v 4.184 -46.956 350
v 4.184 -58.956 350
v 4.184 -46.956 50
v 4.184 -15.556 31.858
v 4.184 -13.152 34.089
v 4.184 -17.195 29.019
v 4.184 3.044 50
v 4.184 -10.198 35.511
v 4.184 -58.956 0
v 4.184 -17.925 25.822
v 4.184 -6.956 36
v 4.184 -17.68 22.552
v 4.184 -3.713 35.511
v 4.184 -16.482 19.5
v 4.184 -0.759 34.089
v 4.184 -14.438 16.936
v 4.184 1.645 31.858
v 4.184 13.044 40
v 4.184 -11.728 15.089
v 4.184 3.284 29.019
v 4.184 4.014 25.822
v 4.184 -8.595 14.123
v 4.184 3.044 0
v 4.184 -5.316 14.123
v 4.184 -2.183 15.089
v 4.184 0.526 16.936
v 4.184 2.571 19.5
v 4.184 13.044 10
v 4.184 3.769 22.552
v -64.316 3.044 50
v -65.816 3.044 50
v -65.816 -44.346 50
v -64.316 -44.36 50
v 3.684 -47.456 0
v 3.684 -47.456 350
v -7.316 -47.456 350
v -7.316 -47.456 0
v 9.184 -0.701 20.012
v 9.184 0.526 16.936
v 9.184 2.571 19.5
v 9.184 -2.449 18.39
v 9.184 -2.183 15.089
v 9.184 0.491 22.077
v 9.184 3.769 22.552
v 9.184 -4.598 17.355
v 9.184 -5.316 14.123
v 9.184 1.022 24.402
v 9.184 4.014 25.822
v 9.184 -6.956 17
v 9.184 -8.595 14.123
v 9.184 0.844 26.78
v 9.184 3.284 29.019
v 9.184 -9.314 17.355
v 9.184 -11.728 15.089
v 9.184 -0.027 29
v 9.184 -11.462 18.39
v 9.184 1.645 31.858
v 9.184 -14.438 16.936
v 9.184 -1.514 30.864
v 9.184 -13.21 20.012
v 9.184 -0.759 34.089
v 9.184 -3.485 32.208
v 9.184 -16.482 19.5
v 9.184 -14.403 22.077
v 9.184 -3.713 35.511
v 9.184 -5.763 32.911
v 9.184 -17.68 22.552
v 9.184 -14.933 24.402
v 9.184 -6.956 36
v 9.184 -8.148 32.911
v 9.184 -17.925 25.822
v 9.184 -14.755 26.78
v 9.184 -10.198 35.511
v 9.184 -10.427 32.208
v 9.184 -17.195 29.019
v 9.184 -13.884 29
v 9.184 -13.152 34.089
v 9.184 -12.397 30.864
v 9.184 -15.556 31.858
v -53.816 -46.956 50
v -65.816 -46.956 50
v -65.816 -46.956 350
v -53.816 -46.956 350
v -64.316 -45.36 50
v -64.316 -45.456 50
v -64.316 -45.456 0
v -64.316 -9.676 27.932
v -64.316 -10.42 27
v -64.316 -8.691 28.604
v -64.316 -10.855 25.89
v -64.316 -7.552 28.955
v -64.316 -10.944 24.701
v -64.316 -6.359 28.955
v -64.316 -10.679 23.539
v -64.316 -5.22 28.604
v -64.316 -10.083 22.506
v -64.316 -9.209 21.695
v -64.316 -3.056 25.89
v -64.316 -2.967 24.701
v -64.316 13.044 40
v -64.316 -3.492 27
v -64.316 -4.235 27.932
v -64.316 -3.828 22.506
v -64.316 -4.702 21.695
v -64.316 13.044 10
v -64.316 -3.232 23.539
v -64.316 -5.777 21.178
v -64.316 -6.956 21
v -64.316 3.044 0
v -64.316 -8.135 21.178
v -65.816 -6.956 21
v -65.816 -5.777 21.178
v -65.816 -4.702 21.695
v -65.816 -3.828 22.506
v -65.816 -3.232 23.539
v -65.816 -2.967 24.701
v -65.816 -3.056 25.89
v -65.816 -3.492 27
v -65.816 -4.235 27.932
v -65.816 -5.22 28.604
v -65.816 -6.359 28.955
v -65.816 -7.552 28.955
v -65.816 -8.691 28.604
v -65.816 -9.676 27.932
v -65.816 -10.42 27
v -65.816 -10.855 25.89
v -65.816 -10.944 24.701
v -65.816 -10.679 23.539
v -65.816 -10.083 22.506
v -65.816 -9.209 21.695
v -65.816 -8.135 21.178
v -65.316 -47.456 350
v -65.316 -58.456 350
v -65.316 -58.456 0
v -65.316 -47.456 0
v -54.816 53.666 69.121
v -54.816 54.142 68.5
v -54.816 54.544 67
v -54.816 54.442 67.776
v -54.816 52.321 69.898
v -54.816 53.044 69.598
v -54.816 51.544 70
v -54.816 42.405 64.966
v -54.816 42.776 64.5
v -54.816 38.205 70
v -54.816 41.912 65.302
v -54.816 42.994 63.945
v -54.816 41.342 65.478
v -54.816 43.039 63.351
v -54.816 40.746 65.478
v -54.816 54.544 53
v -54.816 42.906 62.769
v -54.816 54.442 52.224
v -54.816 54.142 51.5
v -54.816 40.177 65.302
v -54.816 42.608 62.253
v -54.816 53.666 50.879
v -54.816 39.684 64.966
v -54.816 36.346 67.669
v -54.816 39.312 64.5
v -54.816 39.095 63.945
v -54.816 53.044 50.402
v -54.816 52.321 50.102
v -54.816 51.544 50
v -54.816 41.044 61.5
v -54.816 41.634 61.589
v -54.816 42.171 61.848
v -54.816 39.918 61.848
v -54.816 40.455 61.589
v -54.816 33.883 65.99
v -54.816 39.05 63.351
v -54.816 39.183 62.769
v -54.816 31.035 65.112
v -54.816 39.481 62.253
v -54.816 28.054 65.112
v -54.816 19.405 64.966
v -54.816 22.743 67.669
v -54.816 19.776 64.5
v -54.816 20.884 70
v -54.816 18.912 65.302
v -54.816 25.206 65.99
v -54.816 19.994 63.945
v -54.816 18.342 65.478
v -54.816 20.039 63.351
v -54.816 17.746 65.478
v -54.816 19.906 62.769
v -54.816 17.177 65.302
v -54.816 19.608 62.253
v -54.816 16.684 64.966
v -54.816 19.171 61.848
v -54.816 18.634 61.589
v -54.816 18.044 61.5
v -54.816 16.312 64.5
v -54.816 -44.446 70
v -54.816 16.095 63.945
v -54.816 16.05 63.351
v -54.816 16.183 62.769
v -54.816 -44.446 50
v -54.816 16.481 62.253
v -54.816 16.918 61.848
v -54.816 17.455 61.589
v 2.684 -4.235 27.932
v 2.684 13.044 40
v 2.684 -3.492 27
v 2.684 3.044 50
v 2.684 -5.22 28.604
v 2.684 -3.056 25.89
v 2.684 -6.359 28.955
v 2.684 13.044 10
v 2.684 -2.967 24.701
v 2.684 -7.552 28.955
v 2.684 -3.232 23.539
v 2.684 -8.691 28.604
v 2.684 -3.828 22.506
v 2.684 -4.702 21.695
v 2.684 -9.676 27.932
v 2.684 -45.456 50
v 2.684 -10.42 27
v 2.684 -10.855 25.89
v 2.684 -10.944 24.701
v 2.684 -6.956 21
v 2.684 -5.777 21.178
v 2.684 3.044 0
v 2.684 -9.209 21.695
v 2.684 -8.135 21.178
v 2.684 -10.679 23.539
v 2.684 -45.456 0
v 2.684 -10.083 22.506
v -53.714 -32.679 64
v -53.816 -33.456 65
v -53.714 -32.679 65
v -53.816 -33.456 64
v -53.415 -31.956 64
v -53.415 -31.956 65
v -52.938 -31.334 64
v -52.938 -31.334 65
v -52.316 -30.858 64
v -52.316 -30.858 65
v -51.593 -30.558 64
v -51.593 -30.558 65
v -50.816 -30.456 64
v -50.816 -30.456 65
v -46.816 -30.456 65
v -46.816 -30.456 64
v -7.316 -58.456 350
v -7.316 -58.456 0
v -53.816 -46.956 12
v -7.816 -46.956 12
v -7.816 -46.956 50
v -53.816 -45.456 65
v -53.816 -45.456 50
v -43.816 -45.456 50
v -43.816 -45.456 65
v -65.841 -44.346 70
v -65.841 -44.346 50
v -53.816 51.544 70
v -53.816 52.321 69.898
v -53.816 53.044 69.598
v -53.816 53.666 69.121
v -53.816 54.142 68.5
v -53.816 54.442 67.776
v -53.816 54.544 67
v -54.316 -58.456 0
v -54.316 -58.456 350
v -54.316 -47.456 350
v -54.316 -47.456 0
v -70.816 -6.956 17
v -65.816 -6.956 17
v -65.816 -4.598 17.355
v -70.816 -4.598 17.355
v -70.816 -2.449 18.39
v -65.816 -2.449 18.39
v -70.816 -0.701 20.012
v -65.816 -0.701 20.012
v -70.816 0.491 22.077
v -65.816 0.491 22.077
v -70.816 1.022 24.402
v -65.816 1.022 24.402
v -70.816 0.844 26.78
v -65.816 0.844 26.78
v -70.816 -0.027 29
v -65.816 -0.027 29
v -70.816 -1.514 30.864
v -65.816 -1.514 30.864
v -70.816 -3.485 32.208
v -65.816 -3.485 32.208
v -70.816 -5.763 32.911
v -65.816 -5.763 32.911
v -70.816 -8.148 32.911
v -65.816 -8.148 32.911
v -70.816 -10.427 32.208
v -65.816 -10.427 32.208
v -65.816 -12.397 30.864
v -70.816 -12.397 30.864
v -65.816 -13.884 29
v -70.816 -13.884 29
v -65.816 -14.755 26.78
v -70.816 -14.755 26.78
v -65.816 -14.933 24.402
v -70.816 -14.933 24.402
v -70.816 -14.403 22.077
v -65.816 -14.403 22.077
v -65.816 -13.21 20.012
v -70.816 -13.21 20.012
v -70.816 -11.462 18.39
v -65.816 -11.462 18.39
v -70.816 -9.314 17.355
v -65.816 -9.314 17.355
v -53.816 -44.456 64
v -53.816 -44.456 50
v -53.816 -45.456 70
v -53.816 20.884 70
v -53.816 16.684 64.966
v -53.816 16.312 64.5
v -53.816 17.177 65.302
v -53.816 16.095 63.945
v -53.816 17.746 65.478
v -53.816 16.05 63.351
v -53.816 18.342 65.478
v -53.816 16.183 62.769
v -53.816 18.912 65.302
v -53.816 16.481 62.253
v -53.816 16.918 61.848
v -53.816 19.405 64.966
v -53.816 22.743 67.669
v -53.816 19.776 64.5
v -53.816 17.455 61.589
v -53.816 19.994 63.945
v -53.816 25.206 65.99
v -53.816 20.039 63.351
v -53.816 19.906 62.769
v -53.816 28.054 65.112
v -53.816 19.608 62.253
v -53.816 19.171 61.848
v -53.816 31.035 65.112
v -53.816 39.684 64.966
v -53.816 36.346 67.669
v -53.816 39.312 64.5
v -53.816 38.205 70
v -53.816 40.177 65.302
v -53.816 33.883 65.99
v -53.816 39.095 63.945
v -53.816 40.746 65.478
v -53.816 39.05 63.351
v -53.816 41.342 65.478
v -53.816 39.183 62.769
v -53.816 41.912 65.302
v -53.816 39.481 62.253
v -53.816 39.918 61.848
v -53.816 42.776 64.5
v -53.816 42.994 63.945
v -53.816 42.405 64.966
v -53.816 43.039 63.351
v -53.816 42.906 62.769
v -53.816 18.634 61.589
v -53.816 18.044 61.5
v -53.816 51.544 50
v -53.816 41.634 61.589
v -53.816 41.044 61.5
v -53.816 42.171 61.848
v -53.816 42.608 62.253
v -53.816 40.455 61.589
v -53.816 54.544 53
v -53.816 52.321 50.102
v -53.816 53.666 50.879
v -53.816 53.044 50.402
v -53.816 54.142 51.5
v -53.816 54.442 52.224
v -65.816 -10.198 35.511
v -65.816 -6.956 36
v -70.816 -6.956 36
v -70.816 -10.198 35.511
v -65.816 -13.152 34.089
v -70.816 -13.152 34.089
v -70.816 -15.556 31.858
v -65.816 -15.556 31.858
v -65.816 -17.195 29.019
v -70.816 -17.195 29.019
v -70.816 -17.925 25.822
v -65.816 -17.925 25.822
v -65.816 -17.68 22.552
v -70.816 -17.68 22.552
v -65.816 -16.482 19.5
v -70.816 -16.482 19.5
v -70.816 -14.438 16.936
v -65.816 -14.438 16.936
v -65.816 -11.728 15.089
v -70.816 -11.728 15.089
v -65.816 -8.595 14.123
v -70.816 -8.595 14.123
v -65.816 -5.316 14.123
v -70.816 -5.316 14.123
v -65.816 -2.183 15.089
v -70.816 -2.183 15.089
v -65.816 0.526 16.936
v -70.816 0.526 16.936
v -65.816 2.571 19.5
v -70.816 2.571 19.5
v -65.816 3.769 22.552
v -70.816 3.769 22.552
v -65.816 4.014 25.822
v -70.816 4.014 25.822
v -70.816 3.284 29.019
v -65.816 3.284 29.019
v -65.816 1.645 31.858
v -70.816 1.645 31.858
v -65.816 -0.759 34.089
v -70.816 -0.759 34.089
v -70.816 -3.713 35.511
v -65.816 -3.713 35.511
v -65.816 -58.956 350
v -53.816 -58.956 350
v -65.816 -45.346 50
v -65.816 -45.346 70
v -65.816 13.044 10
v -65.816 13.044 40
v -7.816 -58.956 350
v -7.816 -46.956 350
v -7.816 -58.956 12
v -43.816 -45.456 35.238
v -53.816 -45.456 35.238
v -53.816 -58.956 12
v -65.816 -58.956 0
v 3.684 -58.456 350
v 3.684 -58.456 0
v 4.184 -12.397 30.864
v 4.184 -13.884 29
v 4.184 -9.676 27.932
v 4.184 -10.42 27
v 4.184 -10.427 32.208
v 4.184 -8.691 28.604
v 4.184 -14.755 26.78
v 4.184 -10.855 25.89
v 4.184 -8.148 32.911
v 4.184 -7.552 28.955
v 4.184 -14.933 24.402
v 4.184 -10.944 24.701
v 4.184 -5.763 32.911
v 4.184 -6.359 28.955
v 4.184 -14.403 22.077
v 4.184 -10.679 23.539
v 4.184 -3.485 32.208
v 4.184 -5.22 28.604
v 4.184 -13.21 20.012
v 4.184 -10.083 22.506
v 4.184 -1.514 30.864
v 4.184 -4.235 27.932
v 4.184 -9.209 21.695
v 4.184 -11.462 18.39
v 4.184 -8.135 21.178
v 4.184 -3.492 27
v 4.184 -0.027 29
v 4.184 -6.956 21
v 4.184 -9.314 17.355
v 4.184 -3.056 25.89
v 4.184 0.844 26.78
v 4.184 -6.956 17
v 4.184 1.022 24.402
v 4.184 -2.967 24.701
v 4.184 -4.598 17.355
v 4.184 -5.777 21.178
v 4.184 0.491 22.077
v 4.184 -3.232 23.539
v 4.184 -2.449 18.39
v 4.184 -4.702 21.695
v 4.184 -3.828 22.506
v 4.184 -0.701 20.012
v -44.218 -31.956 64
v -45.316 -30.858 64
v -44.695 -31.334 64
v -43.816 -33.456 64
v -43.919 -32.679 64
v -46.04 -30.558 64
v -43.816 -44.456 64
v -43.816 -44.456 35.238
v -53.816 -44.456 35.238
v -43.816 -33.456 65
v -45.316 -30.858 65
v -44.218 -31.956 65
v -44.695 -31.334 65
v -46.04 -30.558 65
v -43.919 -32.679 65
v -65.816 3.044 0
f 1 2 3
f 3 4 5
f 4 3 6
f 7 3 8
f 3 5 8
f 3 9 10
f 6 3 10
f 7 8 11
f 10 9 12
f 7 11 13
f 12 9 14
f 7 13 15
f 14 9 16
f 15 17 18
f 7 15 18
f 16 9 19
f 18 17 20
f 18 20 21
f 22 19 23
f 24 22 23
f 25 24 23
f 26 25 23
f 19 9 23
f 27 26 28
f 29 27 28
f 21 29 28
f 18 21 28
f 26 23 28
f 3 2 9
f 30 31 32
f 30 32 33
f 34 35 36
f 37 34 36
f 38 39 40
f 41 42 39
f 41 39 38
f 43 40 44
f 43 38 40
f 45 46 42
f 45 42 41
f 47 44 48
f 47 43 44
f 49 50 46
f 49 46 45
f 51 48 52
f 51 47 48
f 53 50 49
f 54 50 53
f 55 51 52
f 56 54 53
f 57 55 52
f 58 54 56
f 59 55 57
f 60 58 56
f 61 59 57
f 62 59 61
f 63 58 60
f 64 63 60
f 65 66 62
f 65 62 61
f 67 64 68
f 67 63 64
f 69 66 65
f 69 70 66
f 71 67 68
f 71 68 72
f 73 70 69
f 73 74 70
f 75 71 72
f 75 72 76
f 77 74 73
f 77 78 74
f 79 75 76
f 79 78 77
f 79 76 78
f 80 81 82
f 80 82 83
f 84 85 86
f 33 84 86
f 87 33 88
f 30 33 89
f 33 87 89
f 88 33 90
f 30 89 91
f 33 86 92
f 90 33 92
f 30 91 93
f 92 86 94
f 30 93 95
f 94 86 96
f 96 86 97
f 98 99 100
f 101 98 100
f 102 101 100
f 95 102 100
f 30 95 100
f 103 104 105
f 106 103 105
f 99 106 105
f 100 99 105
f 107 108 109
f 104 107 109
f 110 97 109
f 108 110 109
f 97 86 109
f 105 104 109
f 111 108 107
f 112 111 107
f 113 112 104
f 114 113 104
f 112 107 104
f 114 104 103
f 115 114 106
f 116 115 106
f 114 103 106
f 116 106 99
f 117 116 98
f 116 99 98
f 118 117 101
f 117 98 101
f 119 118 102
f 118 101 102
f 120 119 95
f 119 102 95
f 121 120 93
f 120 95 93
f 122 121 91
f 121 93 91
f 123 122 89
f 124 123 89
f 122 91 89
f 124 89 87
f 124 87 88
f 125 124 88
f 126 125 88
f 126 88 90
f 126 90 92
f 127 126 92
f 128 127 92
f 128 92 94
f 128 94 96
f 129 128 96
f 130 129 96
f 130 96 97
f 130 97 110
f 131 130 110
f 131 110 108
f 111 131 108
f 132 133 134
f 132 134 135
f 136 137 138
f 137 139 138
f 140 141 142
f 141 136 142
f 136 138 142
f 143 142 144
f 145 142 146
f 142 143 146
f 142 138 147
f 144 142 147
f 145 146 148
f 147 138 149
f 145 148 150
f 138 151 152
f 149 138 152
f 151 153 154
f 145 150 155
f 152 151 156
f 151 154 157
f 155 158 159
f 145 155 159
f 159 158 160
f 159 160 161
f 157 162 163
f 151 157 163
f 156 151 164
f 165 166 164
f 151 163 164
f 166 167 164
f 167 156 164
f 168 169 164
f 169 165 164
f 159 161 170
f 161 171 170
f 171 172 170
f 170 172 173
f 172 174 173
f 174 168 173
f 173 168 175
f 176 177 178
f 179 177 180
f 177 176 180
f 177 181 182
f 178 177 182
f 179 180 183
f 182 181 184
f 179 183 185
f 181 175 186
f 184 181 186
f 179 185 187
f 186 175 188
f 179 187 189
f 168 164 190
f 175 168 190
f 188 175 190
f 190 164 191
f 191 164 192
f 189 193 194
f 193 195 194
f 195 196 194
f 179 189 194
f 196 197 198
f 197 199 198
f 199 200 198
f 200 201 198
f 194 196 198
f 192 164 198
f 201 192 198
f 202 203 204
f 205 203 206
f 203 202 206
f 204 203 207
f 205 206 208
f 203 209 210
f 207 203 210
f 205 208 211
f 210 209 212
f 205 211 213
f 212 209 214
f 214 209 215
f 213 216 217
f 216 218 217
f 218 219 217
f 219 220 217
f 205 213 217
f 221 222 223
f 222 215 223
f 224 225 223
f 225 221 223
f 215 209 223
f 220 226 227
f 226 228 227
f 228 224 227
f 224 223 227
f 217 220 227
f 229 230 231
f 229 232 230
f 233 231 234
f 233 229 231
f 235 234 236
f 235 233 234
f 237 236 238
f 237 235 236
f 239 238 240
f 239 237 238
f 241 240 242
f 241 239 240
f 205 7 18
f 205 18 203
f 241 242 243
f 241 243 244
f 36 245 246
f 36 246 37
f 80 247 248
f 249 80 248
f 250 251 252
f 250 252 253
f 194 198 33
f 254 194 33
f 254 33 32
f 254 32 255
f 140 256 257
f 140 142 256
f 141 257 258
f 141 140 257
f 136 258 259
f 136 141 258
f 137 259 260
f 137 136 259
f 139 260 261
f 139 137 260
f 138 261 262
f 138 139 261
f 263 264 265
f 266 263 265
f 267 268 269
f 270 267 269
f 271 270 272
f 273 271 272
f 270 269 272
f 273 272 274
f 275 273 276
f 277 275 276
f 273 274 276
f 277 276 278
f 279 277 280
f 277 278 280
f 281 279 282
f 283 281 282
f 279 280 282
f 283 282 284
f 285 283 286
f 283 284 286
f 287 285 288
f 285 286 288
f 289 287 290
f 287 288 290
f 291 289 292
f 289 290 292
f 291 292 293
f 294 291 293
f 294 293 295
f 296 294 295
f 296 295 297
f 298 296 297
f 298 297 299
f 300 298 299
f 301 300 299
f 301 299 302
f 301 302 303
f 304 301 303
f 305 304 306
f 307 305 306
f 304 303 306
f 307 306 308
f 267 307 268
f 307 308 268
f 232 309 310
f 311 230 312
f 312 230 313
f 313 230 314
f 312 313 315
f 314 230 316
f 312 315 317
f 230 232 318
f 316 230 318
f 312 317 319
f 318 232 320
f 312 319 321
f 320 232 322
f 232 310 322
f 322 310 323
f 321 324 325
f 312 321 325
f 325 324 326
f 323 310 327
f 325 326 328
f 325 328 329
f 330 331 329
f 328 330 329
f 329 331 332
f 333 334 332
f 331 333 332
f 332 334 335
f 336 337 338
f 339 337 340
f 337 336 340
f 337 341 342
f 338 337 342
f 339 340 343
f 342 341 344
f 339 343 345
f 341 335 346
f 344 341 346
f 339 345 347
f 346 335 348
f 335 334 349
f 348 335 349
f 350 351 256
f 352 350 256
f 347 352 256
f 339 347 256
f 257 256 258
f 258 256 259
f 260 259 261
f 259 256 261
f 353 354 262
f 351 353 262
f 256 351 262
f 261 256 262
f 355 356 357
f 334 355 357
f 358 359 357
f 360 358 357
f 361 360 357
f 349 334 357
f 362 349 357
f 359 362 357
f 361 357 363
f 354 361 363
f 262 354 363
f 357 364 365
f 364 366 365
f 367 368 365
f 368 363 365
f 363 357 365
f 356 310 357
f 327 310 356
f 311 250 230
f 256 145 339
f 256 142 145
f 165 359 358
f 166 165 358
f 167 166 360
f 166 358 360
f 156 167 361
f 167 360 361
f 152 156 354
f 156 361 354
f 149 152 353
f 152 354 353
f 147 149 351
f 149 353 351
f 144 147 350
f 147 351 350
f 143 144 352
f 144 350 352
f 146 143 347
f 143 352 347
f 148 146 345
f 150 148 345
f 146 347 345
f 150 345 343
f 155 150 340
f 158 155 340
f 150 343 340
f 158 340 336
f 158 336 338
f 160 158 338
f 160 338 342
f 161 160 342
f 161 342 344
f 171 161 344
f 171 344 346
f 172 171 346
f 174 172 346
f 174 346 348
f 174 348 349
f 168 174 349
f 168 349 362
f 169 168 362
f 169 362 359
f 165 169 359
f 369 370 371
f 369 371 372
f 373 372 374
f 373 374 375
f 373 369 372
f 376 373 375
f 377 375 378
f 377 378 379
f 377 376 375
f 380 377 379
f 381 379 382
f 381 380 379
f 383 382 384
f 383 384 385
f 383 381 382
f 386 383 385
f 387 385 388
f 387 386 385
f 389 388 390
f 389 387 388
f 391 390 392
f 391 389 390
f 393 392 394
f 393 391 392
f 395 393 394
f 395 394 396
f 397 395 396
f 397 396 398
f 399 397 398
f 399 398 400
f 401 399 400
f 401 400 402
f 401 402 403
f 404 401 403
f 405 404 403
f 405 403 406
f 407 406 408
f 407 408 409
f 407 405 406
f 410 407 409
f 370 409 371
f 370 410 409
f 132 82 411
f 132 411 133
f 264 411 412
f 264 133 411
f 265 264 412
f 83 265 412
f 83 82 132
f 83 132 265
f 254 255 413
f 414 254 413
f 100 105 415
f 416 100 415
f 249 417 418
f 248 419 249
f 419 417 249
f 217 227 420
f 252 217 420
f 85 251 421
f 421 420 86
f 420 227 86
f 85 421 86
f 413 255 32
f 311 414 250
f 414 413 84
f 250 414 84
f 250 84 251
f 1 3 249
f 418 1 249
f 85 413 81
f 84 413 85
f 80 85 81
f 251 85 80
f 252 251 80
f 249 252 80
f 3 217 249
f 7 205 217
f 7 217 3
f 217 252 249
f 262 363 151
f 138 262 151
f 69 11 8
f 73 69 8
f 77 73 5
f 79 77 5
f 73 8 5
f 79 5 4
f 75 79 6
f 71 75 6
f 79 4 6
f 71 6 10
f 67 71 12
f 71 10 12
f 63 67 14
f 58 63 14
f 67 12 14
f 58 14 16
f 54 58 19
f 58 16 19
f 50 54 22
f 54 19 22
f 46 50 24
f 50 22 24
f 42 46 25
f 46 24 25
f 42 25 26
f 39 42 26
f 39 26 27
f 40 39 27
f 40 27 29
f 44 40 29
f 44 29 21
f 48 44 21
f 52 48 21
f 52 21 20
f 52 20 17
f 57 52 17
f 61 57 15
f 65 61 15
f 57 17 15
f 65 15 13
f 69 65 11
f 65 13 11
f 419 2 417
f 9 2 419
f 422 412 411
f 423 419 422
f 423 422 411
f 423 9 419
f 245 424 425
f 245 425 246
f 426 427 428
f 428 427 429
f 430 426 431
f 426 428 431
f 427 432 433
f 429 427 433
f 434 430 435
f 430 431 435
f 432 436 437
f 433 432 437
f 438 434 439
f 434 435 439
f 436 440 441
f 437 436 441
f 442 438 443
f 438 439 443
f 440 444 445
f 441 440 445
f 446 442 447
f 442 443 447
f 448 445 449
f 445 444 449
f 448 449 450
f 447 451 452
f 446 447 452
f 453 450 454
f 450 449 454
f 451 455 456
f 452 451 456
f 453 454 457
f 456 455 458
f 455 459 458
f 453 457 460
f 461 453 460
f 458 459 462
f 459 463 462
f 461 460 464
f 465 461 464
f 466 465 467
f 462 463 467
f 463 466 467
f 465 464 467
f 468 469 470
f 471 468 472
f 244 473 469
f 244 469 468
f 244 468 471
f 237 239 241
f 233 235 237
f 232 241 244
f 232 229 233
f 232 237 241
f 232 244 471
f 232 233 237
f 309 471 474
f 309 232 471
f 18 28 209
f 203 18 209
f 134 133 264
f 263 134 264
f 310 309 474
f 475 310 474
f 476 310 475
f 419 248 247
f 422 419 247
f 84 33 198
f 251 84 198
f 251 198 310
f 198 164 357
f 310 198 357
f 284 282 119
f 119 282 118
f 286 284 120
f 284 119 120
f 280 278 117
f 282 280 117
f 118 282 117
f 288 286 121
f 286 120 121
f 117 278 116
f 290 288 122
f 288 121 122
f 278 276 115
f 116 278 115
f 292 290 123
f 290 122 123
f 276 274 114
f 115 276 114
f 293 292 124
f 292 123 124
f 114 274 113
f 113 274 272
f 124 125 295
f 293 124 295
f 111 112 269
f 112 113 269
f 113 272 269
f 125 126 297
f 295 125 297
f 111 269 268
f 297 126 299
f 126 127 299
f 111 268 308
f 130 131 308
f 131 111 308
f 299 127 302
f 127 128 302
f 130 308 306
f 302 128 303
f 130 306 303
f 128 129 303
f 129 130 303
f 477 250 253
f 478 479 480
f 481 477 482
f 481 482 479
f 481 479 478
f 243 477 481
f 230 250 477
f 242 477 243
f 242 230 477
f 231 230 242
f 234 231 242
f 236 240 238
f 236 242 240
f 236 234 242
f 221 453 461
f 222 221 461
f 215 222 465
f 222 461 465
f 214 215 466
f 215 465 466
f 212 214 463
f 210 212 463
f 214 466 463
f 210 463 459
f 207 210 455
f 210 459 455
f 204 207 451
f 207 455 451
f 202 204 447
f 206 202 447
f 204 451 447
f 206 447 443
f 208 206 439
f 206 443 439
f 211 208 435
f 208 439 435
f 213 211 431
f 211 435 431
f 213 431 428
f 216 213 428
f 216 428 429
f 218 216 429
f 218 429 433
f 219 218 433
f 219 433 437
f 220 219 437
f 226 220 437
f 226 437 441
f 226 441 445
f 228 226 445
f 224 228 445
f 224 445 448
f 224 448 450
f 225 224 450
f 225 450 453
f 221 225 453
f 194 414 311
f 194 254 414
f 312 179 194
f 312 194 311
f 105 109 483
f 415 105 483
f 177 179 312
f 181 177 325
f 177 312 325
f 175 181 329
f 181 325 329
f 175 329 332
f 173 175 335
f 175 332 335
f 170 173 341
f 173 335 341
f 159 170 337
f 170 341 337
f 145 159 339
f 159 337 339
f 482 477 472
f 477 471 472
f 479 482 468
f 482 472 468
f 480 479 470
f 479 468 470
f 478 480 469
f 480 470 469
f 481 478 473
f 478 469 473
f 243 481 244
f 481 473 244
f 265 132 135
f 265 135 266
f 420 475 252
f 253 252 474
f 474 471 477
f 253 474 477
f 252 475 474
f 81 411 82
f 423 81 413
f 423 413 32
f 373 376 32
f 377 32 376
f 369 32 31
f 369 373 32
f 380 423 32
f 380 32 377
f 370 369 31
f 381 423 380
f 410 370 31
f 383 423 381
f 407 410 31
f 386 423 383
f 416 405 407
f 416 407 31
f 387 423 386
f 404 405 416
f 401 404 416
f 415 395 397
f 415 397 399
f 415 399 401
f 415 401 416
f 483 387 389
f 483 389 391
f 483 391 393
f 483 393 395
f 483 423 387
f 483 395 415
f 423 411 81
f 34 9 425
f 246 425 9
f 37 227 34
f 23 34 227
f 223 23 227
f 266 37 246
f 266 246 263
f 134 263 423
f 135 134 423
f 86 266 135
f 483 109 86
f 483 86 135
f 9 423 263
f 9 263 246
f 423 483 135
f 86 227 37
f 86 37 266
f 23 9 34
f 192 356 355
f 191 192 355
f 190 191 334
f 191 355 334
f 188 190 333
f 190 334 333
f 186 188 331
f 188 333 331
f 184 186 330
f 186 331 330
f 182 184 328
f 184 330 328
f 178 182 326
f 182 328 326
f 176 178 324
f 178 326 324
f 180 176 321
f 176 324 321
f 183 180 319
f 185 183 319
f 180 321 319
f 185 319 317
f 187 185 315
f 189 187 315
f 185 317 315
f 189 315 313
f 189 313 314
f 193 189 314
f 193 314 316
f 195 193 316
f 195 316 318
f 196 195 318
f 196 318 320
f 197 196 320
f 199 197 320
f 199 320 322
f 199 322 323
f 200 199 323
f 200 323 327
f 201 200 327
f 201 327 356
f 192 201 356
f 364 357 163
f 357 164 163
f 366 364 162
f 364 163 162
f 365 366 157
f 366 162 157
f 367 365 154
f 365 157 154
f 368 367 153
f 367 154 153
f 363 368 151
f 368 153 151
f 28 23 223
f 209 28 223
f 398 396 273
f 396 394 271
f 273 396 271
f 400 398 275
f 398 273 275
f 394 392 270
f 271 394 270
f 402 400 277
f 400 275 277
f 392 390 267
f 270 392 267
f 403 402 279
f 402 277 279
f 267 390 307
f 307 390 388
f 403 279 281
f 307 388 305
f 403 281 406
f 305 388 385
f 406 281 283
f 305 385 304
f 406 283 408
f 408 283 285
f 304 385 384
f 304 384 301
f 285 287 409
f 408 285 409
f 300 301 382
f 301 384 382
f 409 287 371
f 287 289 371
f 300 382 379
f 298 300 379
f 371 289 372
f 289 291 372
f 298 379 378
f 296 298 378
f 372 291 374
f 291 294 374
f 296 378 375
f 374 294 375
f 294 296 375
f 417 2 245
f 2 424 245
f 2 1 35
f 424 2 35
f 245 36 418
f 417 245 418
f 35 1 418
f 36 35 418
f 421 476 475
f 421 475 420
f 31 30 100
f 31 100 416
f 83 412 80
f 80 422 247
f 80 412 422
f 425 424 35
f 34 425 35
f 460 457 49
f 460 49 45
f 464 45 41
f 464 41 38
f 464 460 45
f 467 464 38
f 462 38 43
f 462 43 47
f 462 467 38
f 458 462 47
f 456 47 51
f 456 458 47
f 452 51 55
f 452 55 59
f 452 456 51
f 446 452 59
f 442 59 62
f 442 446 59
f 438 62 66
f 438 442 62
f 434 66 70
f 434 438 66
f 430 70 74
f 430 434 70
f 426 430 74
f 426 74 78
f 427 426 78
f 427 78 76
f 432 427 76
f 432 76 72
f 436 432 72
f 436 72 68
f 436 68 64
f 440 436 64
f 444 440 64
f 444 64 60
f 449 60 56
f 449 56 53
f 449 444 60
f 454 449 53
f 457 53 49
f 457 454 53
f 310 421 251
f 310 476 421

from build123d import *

# Parameters (mm, degrees)
BOSS_EXTRUDE1_DEPTH = 50
CHAMFER1_SIZE       = 10
SKETCH2_R           = 4
CUT_EXTRUDE1_DEPTH  = 80
SKETCH3_R           = 11
SKETCH3_R_2         = 8
BOSS_EXTRUDE2_DEPTH = 5
SKETCH4_W           = 12
SKETCH4_H           = 12
BOSS_EXTRUDE3_DEPTH = 350
SKETCH5_W           = 46
SKETCH5_H           = 12
BOSS_EXTRUDE4_DEPTH = 12
SKETCH9_W           = 11
SKETCH9_H           = 11
CUT_EXTRUDE3_DEPTH  = 380
BOSS_EXTRUDE5_DEPTH = 10
FILLET1_R           = 3
BOSS_EXTRUDE6_DEPTH = 20
FILLET2_R           = 3
SKETCH12_R          = 10
SKETCH12_R_2        = 2
CUT_EXTRUDE5_DEPTH  = 10


with BuildPart() as part:
    # Sketch1 → Boss-Extrude1 (new body)
    with BuildSketch(Plane.XY):
        Polygon((-65.816488176, 13.044356197), (-65.816488176, -46.955643803), (4.183511824, -46.955643803), (4.183511824, 13.044356197), (2.683511824, 13.044356197), (2.683511824, -45.455643803), (-64.316488176, -45.455643803), (-64.316488176, 13.044356197), align=None)
    extrude(amount=BOSS_EXTRUDE1_DEPTH)

    # Chamfer1
    chamfer1_edges = [part.edges().sort_by_distance(p)[0] for p in [
        (-65.066488176, 13.044356197, 0),
        (3.433511824, 13.044356197, 50),
        (-65.066488176, 13.044356197, 50),
        (3.433511824, 13.044356197, 0),
    ]]
    chamfer(chamfer1_edges, length=CHAMFER1_SIZE)

    # Sketch2 → Cut-Extrude1 (cut)
    with BuildSketch(Plane(origin=(4.183511824, 0, 0), x_dir=(0, 0, -1), z_dir=(1, 0, 0))):
        with Locations((-25, -6.955643803)):
            Circle(SKETCH2_R)
    extrude(amount=-CUT_EXTRUDE1_DEPTH, mode=Mode.SUBTRACT)

    # Sketch3 → Boss-Extrude2 (add)
    with BuildSketch(Plane(origin=(4.183511824, 0, 0), x_dir=(0, 0, -1), z_dir=(1, 0, 0))):
        with Locations(Location((-25, -6.955643803, 0), (0, 0, 180))):
            Circle(SKETCH3_R)
        with Locations((-25, -6.955643803)):
            Circle(SKETCH3_R_2, mode=Mode.SUBTRACT)
    boss_extrude2 = extrude(amount=BOSS_EXTRUDE2_DEPTH)

    # Mirror1: Boss-Extrude2 across plane
    add(boss_extrude2.mirror(Plane.ZY.offset(30.816488176)))

    # Sketch4 → Boss-Extrude3 (add)
    with BuildSketch(Plane(origin=(0, 0, 0), x_dir=(-1, 0, 0), z_dir=(0, 0, -1))):
        with Locations((1.816488176, -52.955643803)):
            Rectangle(SKETCH4_W, SKETCH4_H)
    boss_extrude3 = extrude(amount=-BOSS_EXTRUDE3_DEPTH)

    # Mirror2: Boss-Extrude3 across plane
    add(boss_extrude3.mirror(Plane.ZY.offset(30.816488176)))

    # Sketch5 → Boss-Extrude4 (add)
    with BuildSketch(Plane(origin=(0, 0, 0), x_dir=(-1, 0, 0), z_dir=(0, 0, -1))):
        with Locations((30.816488176, -52.955643803)):
            Rectangle(SKETCH5_W, SKETCH5_H)
    extrude(amount=-BOSS_EXTRUDE4_DEPTH)

    # Sketch9 → Cut-Extrude3 (cut)
    with BuildSketch(Plane.XY.offset(350)):
        with Locations((-59.816488176, -52.955643803)):
            Rectangle(SKETCH9_W, SKETCH9_H)
    cut_extrude3 = extrude(amount=-CUT_EXTRUDE3_DEPTH, mode=Mode.SUBTRACT)

    # Mirror3: Cut-Extrude3 across plane
    add(cut_extrude3.mirror(Plane.ZY.offset(30.816488176)), mode=Mode.SUBTRACT)

    # Sketch10 → Boss-Extrude5 (add)
    with BuildSketch(Plane(origin=(-53.816488176, 0, 0), x_dir=(0, 0, -1), z_dir=(1, 0, 0))):
        Polygon((-35.237542048, -45.455643803), (-65, -45.455643803), (-65, -30.455643803), (-64, -30.455643803), (-64, -44.455643803), (-35.237542048, -44.455643803), align=None)
    extrude(amount=BOSS_EXTRUDE5_DEPTH)

    # Fillet1
    fillet1_edges = [part.edges().sort_by_distance(p)[0] for p in [
        (-53.816488176, -30.455643803, 64.5),
        (-43.816488176, -30.455643803, 64.5),
    ]]
    fillet(fillet1_edges, radius=FILLET1_R)

    # Sketch11 → Boss-Extrude6 (add)
    with BuildSketch(Plane.XY.offset(50)):
        Polygon((-65.816488176, -45.345911858), (-53.816488176, -45.455643803), (-53.816488176, 54.544356197), (-54.816488176, 54.544356197), (-54.816488176, -44.446457666), (-65.840689421, -44.345648745), align=None)
    extrude(amount=BOSS_EXTRUDE6_DEPTH)

    # Fillet2
    fillet2_edges = [part.edges().sort_by_distance(p)[0] for p in [
        (-54.316488176, 54.544356197, 50),
        (-54.316488176, 54.544356197, 70),
    ]]
    fillet(fillet2_edges, radius=FILLET2_R)

    # Sketch12 → Cut-Extrude5 (cut)
    with BuildSketch(Plane(origin=(-53.816488176, 0, 0), x_dir=(0, 0, -1), z_dir=(1, 0, 0))):
        with Locations((-75, 29.544356197)):
            Circle(SKETCH12_R)
        with Locations((-63.5, 41.044356197)):
            Circle(SKETCH12_R_2)
        with Locations((-63.5, 18.044356197)):
            Circle(SKETCH12_R_2)
    extrude(amount=-CUT_EXTRUDE5_DEPTH, mode=Mode.SUBTRACT)


solid = part.part
